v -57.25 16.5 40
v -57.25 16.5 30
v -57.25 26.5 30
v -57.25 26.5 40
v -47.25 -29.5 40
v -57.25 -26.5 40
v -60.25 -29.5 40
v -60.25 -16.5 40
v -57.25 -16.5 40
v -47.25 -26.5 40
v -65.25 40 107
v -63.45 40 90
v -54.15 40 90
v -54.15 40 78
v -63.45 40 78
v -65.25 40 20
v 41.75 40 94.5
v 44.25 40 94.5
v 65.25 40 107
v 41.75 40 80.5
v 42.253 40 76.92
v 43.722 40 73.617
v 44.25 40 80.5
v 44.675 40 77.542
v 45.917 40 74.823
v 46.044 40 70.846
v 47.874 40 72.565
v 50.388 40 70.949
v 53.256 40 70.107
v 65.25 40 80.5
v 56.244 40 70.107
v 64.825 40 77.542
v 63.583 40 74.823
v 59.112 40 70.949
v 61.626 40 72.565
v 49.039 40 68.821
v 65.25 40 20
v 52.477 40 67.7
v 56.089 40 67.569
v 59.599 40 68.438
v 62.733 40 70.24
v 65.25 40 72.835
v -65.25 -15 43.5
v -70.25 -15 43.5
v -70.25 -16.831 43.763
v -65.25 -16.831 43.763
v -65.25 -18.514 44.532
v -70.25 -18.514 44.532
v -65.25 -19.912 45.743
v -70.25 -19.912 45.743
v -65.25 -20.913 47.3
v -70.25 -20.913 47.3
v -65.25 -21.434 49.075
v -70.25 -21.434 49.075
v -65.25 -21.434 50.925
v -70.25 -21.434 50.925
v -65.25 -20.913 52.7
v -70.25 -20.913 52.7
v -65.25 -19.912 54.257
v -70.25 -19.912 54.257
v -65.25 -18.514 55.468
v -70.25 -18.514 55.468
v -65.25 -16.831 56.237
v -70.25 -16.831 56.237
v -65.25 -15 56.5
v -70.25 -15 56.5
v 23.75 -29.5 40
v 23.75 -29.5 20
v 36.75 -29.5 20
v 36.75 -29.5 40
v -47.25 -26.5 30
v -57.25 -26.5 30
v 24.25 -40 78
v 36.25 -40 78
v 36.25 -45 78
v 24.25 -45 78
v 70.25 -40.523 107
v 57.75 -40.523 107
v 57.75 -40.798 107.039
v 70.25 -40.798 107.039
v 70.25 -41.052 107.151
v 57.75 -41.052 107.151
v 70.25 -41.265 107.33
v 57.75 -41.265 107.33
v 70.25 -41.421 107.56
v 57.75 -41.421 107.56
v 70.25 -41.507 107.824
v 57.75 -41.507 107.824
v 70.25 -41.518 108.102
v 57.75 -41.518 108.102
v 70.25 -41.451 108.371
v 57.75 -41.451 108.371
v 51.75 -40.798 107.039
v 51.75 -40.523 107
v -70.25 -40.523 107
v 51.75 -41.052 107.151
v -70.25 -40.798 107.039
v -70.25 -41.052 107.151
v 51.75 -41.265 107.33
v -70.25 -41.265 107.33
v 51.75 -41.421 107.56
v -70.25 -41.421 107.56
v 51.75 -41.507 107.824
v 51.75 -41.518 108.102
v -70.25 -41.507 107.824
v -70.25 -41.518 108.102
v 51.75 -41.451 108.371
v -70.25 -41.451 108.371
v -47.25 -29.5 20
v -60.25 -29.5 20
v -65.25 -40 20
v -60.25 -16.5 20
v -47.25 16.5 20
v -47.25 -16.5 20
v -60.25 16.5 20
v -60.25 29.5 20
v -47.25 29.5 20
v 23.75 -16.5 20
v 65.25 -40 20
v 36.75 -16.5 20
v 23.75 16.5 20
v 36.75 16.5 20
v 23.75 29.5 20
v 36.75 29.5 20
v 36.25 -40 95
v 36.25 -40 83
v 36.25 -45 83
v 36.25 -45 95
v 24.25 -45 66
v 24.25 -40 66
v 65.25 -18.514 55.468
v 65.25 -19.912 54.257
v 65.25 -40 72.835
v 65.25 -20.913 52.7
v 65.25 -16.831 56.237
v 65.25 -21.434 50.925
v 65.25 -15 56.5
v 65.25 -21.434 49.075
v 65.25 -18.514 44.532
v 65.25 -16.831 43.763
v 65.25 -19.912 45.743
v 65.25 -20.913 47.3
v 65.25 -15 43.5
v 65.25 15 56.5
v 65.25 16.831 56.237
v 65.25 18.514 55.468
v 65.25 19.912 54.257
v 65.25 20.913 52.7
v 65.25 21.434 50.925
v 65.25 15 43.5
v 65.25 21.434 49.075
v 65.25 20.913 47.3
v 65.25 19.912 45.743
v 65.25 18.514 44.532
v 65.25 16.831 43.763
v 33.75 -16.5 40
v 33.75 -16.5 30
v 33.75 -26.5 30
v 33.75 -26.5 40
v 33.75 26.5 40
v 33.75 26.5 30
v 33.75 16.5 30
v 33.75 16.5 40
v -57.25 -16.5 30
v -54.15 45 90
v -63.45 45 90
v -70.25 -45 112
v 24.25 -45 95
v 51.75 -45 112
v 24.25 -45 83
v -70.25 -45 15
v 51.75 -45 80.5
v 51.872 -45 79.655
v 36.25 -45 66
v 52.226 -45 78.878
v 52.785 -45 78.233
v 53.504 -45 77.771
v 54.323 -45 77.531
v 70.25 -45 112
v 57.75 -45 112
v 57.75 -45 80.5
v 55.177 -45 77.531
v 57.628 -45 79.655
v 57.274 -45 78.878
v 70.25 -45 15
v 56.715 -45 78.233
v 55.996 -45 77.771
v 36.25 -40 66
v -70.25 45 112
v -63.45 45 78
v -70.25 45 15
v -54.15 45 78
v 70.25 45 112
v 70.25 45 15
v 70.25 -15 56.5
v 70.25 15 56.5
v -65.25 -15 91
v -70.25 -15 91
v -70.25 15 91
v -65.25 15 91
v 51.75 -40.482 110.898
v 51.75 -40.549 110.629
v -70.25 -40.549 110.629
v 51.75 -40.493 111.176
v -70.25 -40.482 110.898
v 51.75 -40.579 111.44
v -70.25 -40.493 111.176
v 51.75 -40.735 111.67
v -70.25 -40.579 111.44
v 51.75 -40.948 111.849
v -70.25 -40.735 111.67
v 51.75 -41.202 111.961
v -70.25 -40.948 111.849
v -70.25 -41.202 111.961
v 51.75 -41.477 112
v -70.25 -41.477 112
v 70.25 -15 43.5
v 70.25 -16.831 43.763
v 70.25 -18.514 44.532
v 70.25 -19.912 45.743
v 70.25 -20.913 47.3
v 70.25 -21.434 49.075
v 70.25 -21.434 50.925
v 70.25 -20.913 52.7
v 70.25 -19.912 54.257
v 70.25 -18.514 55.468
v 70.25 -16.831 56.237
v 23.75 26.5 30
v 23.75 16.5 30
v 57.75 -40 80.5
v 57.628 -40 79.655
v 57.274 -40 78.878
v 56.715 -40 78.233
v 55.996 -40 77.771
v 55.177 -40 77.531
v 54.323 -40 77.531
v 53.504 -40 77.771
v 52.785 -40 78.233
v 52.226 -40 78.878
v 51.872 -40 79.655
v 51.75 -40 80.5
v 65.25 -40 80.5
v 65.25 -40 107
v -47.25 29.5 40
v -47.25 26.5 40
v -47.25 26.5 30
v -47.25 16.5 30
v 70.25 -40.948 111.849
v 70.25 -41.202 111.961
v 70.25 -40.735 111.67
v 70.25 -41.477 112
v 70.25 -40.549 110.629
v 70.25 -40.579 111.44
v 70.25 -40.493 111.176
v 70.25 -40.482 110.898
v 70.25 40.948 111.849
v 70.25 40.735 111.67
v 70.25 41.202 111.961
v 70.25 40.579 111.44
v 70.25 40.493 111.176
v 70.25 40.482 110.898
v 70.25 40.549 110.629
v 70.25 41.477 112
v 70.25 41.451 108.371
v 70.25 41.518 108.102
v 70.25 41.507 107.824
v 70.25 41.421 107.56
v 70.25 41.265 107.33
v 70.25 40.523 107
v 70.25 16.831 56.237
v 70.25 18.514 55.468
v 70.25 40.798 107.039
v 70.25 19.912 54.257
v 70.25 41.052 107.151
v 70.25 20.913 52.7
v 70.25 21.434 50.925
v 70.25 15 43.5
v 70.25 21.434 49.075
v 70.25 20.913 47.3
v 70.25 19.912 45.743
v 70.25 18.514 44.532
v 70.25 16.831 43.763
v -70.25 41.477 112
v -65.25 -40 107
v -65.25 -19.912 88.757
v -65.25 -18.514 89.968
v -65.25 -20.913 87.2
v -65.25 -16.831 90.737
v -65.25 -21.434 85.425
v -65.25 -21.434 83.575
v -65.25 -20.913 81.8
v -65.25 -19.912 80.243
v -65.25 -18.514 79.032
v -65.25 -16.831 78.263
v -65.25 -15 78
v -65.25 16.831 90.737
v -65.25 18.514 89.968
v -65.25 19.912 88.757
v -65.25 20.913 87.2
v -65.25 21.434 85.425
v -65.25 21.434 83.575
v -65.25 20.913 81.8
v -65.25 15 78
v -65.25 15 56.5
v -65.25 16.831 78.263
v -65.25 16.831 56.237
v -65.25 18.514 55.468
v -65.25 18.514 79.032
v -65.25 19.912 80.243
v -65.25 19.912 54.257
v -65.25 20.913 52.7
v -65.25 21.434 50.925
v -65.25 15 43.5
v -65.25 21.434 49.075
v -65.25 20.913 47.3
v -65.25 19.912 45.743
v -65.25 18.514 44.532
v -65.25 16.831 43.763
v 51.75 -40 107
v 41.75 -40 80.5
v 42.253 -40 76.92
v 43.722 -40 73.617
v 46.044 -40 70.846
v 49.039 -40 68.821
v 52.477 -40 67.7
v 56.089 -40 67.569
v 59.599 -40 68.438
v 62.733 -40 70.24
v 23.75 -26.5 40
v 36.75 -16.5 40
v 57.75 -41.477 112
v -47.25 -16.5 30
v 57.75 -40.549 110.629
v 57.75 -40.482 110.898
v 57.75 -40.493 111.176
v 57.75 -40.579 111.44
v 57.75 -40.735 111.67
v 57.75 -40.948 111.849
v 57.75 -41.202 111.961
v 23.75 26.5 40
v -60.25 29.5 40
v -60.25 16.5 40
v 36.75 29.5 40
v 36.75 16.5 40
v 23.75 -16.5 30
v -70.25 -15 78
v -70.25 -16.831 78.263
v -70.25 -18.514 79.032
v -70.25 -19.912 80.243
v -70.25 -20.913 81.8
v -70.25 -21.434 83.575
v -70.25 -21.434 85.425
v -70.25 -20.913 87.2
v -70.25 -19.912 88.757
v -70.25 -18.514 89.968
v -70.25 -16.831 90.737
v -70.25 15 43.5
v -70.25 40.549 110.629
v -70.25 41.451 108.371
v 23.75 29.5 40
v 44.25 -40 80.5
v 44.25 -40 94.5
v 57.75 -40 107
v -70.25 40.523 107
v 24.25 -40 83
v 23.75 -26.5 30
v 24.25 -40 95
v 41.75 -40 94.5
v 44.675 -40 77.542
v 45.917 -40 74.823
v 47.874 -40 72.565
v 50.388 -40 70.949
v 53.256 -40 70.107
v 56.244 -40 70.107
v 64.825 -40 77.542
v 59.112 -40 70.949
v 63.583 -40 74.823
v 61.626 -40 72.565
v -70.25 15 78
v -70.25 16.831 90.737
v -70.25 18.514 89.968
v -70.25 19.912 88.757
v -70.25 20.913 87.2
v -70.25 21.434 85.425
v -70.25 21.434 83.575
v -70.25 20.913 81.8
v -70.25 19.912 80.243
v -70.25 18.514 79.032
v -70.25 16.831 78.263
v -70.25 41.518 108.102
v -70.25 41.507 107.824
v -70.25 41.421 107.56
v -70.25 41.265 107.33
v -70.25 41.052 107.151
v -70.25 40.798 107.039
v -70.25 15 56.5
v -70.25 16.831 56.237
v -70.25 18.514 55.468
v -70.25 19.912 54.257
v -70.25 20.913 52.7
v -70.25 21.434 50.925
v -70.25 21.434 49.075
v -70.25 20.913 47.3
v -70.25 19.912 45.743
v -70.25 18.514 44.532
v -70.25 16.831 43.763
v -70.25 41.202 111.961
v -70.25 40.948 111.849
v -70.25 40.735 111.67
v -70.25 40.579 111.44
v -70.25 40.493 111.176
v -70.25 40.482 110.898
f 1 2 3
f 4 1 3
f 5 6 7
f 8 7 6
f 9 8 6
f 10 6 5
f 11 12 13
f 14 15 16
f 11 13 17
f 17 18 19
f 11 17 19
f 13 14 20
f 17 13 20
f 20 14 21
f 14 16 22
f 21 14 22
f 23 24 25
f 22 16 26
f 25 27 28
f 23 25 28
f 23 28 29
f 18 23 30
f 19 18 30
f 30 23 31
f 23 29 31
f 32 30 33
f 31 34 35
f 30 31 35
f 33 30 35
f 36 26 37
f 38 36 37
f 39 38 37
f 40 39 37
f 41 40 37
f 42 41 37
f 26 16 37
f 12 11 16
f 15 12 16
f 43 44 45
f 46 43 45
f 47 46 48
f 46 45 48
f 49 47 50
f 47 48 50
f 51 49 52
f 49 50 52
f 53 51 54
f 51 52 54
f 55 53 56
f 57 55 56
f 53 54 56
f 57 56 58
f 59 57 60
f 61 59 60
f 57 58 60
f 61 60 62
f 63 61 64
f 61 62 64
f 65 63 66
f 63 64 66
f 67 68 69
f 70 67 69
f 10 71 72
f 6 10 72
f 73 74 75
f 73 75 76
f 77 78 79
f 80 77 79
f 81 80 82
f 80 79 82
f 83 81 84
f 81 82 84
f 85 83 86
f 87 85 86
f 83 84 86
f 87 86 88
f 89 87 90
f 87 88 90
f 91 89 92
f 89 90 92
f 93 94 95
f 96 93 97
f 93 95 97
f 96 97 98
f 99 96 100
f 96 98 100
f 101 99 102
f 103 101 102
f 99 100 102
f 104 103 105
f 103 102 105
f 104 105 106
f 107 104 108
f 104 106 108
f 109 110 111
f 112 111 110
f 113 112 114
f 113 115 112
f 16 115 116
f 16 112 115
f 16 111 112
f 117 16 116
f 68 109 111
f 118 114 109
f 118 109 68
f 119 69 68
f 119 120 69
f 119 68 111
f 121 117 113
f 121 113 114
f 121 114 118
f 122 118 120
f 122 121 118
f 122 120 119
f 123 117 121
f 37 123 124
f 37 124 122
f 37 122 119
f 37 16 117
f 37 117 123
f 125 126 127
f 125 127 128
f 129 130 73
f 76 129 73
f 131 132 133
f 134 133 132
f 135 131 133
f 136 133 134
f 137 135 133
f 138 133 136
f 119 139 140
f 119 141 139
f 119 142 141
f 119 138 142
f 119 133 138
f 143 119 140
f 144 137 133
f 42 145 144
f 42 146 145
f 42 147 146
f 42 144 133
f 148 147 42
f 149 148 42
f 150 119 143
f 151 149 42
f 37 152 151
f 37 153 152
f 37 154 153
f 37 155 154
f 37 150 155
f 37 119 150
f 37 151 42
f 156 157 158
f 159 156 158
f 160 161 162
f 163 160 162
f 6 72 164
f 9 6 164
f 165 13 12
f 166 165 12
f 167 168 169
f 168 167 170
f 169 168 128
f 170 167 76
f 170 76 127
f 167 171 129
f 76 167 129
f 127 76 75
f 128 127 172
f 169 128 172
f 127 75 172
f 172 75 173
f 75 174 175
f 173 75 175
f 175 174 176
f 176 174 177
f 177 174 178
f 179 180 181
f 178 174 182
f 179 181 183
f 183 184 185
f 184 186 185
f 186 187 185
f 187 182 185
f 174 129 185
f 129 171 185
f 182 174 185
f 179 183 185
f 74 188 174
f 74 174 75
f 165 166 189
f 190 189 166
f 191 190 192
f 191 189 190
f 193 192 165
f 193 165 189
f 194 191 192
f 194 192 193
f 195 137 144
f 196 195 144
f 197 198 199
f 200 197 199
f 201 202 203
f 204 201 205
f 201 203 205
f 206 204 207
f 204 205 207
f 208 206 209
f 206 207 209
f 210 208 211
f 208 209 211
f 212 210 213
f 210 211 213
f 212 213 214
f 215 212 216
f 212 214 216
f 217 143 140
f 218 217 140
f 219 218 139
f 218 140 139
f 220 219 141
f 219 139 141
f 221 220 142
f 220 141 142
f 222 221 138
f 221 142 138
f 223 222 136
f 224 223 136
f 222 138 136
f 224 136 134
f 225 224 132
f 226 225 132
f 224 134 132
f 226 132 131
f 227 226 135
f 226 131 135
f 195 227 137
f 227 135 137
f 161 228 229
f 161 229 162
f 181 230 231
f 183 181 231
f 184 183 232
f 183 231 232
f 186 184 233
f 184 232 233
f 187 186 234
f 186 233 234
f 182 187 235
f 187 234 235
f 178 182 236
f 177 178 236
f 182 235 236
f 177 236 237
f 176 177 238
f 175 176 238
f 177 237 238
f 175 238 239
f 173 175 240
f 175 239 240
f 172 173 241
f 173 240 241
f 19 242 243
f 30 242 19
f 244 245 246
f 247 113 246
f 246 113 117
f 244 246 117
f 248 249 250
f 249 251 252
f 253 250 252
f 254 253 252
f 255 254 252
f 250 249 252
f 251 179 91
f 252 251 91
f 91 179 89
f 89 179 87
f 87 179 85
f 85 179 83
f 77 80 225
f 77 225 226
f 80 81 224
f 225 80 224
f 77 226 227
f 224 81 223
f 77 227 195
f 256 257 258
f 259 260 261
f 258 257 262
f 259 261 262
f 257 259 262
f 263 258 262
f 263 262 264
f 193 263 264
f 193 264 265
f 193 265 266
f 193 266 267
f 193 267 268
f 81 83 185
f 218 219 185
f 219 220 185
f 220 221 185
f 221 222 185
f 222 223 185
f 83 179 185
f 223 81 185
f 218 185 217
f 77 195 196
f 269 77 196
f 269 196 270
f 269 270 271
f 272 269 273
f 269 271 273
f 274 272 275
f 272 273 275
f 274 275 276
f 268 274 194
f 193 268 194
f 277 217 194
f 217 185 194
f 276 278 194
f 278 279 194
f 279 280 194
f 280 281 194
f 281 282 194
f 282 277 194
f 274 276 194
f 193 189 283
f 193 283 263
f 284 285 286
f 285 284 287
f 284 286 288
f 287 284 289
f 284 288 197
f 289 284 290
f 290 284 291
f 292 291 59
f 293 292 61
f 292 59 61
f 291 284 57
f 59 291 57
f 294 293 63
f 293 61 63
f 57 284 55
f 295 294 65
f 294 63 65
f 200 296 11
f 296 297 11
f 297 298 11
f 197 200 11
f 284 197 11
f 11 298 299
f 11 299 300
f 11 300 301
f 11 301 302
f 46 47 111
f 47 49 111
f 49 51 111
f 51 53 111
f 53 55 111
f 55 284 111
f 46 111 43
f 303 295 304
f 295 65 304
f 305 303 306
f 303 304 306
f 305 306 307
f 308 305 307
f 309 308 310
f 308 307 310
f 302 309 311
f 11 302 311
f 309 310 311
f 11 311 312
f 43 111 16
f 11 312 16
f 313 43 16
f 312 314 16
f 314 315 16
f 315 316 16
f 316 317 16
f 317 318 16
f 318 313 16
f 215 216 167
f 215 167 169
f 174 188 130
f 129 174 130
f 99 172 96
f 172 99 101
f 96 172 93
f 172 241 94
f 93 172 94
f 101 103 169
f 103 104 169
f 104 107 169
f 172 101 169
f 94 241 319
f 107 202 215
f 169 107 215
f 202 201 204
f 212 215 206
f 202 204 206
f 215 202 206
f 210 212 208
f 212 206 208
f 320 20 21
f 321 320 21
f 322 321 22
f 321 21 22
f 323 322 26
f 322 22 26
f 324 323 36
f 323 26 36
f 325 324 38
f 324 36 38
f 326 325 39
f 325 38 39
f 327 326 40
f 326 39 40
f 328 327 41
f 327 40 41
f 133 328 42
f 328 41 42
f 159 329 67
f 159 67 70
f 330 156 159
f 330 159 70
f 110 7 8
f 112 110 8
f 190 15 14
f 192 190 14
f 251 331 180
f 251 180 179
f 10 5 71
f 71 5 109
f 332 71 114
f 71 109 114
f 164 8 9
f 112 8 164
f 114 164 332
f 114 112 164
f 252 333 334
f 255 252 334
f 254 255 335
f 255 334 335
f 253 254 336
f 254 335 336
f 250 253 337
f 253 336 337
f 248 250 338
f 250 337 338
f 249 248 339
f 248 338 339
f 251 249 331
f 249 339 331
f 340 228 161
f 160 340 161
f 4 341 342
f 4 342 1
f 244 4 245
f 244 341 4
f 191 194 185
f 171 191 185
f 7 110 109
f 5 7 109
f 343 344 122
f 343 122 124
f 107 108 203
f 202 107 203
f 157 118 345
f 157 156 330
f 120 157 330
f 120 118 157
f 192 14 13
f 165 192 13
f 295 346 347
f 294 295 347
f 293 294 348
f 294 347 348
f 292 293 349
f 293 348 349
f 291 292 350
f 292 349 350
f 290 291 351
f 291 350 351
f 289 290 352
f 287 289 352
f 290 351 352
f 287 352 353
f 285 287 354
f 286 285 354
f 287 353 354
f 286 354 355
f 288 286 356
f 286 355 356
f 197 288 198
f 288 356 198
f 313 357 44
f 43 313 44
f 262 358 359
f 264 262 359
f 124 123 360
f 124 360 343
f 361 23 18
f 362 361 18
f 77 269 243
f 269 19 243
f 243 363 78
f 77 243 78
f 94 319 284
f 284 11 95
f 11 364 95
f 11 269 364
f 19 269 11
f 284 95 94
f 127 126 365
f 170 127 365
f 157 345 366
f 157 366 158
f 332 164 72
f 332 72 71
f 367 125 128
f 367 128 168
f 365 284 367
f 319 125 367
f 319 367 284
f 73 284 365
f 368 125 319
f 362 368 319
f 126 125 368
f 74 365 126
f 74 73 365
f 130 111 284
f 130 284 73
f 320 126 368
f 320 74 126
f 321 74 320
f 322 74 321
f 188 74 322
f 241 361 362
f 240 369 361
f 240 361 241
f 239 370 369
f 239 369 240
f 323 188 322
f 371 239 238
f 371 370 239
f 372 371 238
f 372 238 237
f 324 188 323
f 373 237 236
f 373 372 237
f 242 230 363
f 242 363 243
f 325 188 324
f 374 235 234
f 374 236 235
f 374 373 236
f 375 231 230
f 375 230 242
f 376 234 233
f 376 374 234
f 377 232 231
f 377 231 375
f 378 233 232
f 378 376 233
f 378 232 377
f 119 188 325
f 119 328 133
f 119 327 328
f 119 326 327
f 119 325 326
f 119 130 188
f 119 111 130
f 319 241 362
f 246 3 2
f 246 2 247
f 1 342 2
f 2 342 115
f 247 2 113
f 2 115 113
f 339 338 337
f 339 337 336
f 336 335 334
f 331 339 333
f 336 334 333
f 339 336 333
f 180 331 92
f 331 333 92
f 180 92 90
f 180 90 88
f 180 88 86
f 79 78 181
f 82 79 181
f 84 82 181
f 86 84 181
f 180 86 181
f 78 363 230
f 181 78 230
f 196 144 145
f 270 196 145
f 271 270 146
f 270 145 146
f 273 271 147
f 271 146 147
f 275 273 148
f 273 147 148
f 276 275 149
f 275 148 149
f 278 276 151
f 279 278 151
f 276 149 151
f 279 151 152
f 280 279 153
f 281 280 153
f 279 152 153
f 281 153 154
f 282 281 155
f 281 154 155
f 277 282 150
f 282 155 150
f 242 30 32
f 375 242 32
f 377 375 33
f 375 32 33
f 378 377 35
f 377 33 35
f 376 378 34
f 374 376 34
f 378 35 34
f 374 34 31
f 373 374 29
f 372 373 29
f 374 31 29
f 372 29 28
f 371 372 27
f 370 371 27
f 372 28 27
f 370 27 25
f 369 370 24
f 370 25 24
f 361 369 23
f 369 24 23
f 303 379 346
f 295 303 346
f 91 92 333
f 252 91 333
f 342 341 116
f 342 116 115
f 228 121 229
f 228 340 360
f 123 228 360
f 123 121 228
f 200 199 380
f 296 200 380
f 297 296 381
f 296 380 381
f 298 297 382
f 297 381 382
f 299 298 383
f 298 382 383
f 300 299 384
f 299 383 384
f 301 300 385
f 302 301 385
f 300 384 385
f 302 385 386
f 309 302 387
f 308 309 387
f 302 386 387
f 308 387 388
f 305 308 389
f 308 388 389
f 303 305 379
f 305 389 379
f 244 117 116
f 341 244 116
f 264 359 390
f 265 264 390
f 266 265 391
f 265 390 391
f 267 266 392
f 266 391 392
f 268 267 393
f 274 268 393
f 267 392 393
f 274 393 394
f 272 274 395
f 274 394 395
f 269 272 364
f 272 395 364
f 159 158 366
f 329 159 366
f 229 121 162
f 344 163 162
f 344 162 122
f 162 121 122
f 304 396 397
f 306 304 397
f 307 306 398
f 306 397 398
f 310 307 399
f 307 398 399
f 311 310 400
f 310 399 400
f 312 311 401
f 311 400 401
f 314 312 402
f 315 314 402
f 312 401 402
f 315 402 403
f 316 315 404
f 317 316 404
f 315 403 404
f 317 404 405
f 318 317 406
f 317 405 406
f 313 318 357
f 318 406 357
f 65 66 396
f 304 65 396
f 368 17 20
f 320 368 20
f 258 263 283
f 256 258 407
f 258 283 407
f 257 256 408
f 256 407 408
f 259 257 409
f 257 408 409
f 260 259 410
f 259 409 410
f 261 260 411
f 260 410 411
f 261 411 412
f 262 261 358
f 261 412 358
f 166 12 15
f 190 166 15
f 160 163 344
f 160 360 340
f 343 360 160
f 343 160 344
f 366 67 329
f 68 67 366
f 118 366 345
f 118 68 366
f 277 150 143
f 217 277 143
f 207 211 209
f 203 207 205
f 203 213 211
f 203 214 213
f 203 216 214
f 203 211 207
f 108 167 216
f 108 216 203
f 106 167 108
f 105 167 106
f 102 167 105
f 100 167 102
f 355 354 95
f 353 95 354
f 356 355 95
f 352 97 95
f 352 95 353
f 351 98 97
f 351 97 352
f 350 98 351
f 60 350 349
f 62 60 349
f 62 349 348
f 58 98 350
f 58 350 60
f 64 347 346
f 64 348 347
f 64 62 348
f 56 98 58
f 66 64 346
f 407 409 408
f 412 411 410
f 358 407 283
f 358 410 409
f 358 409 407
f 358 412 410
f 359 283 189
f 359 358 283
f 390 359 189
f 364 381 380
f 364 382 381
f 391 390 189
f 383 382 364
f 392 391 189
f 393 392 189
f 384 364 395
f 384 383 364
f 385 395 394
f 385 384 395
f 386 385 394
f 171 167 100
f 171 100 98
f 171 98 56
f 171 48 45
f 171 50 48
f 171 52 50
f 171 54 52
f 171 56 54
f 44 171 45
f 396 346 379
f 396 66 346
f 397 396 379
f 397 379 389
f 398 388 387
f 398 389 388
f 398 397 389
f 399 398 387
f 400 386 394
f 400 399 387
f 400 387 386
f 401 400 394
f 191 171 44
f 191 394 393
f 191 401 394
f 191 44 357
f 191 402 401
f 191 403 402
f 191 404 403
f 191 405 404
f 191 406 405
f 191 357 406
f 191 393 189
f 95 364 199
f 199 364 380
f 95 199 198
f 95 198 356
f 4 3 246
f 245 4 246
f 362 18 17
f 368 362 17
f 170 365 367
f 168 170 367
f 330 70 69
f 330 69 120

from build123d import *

# Parameters (mm, degrees)
F0_W      = 140.5
F0_H      = 90
F1_DEPTH  = 112
F2_T      = -5
F4_DEPTH  = 147.9
F6_DEPTH  = 83.1
F7_W      = 12
F7_H      = 12
F8_DEPTH  = 25
F9_W      = 130.5
F9_H      = 80
F10_DEPTH = 15
F11_W     = 90
F11_H     = 15
F12_DEPTH = 174.4
F14_DEPTH = 25
F15_W     = 13
F15_H     = 13
F16_DEPTH = 10
F18_DEPTH = 10
F20_DEPTH = 61.2


with BuildPart() as f1:
    # F0 (on Top) → F1 (new body)
    with BuildSketch(Plane.XY):
        Rectangle(F0_W, F0_H)
    extrude(amount=F1_DEPTH)

    # F2
    f2_openings = [f1.faces().sort_by_distance(p)[0] for p in [
        (0, 0, 112),
    ]]
    offset(amount=F2_T, openings=f2_openings)

    # F3 (on face) → F4 (cut)
    with BuildSketch(Plane(origin=(-70.25, 0, 0), x_dir=(0, -1, 0), z_dir=(-1, 0, 0))):
        with BuildLine():
            Line((-40.522967, 107), (-40, 107))
            Line((-40, 107), (40, 107))
            Line((40, 107), (40.522967, 107))
            ThreePointArc((40.522967, 107), (41.351034, 107.439371), (41.451444, 108.371391))
            Line((41.451444, 108.371391), (40.548556, 110.628609))
            ThreePointArc((40.548556, 110.628609), (40.648966, 111.560629), (41.477033, 112))
            Line((41.477033, 112), (-41.477033, 112))
            ThreePointArc((-41.477033, 112), (-40.648966, 111.560629), (-40.548556, 110.628609))
            Line((-40.548556, 110.628609), (-41.451444, 108.371391))
            ThreePointArc((-41.451444, 108.371391), (-41.351034, 107.439371), (-40.522967, 107))
        make_face()
    extrude(amount=-F4_DEPTH, mode=Mode.SUBTRACT)

    # F5 (on face) → F6 (join)
    with BuildSketch(Plane.XZ.offset(-40)):
        with BuildLine():
            ThreePointArc((65.25, 80.5), (54.75, 70), (44.25, 80.5))
            Line((44.25, 80.5), (44.25, 94.5))
            Line((44.25, 94.5), (41.75, 94.5))
            Line((41.75, 94.5), (41.75, 80.5))
            ThreePointArc((41.75, 80.5), (50.718871, 68.140793), (65.25, 72.835145))
            Line((65.25, 72.835145), (65.25, 80.5))
        make_face()
    extrude(amount=F6_DEPTH)

    # F7 (on face) → F8 (cut)
    with BuildSketch(Plane(origin=(0, -40, 0), x_dir=(-1, 0, 0), z_dir=(0, 1, 0))):
        with BuildLine():
            Line((-57.75, 112.14032), (-57.75, 80.5))
            ThreePointArc((-57.75, 80.5), (-54.75, 77.5), (-51.75, 80.5))
            Line((-51.75, 80.5), (-51.75, 112.14032))
            Line((-51.75, 112.14032), (-57.75, 112.14032))
        make_face()
        with Locations((-30.25, 89)):
            Rectangle(F7_W, F7_H)
        with Locations((-30.25, 72)):
            Rectangle(F7_W, F7_H)
    extrude(amount=-F8_DEPTH, mode=Mode.SUBTRACT)

    # F9 (on face) → F10 (join)
    with BuildSketch(Plane.XY.offset(5)):
        Rectangle(F9_W, F9_H)
    extrude(amount=F10_DEPTH)

    # F11 (on face) → F12 (cut)
    with BuildSketch(Plane(origin=(-70.25, 0, 0), x_dir=(0, -1, 0), z_dir=(-1, 0, 0))):
        with Locations((0, 7.5)):
            Rectangle(F11_W, F11_H)
        with BuildLine():
            ThreePointArc((15, 43.5), (21.5, 50), (15, 56.5))
            Line((15, 56.5), (-15, 56.5))
            ThreePointArc((-15, 56.5), (-21.5, 50), (-15, 43.5))
            Line((-15, 43.5), (15, 43.5))
        make_face()
    extrude(amount=-F12_DEPTH, mode=Mode.SUBTRACT)

    # F13 (on face) → F14 (cut)
    with BuildSketch(Plane(origin=(-70.25, 0, 0), x_dir=(0, -1, 0), z_dir=(-1, 0, 0))):
        with BuildLine():
            Line((-15, 78), (15, 78))
            ThreePointArc((15, 78), (21.5, 84.5), (15, 91))
            Line((15, 91), (-15, 91))
            ThreePointArc((-15, 91), (-21.5, 84.5), (-15, 78))
        make_face()
    extrude(amount=-F14_DEPTH, mode=Mode.SUBTRACT)

    # F15 (on face) → F16 (join)
    with BuildSketch(Plane.XY.offset(20)):
        with Locations((-53.75, 23)):
            Rectangle(F15_W, F15_H)
        with Locations((30.25, 23)):
            Rectangle(F15_W, F15_H)
        with Locations((30.25, -23)):
            Rectangle(F15_W, F15_H)
        with Locations((-53.75, -23)):
            Rectangle(F15_W, F15_H)
    extrude(amount=F16_DEPTH)

    # F17 (on face) → F18 (join)
    with BuildSketch(Plane.XY.offset(30)):
        Polygon((-47.25, 29.5), (-60.25, 29.5), (-60.25, 16.5), (-57.25, 16.5), (-57.25, 26.5), (-47.25, 26.5), align=None)
        Polygon((-60.25, -29.5), (-47.25, -29.5), (-47.25, -26.5), (-57.25, -26.5), (-57.25, -16.5), (-60.25, -16.5), align=None)
        Polygon((33.75, 26.5), (33.75, 16.5), (36.75, 16.5), (36.75, 29.5), (23.75, 29.5), (23.75, 26.5), align=None)
        Polygon((23.75, -26.5), (23.75, -29.5), (36.75, -29.5), (36.75, -16.5), (33.75, -16.5), (33.75, -26.5), align=None)
    extrude(amount=F18_DEPTH)

    # F19 (on Front) → F20 (cut)
    with BuildSketch(Plane.XZ):
        Polygon((-63.45, 90), (-63.45, 78), (-58.946795, 78), (-54.15, 78), (-54.15, 90), align=None)
    extrude(amount=-F20_DEPTH, mode=Mode.SUBTRACT)


solid = f1.part
